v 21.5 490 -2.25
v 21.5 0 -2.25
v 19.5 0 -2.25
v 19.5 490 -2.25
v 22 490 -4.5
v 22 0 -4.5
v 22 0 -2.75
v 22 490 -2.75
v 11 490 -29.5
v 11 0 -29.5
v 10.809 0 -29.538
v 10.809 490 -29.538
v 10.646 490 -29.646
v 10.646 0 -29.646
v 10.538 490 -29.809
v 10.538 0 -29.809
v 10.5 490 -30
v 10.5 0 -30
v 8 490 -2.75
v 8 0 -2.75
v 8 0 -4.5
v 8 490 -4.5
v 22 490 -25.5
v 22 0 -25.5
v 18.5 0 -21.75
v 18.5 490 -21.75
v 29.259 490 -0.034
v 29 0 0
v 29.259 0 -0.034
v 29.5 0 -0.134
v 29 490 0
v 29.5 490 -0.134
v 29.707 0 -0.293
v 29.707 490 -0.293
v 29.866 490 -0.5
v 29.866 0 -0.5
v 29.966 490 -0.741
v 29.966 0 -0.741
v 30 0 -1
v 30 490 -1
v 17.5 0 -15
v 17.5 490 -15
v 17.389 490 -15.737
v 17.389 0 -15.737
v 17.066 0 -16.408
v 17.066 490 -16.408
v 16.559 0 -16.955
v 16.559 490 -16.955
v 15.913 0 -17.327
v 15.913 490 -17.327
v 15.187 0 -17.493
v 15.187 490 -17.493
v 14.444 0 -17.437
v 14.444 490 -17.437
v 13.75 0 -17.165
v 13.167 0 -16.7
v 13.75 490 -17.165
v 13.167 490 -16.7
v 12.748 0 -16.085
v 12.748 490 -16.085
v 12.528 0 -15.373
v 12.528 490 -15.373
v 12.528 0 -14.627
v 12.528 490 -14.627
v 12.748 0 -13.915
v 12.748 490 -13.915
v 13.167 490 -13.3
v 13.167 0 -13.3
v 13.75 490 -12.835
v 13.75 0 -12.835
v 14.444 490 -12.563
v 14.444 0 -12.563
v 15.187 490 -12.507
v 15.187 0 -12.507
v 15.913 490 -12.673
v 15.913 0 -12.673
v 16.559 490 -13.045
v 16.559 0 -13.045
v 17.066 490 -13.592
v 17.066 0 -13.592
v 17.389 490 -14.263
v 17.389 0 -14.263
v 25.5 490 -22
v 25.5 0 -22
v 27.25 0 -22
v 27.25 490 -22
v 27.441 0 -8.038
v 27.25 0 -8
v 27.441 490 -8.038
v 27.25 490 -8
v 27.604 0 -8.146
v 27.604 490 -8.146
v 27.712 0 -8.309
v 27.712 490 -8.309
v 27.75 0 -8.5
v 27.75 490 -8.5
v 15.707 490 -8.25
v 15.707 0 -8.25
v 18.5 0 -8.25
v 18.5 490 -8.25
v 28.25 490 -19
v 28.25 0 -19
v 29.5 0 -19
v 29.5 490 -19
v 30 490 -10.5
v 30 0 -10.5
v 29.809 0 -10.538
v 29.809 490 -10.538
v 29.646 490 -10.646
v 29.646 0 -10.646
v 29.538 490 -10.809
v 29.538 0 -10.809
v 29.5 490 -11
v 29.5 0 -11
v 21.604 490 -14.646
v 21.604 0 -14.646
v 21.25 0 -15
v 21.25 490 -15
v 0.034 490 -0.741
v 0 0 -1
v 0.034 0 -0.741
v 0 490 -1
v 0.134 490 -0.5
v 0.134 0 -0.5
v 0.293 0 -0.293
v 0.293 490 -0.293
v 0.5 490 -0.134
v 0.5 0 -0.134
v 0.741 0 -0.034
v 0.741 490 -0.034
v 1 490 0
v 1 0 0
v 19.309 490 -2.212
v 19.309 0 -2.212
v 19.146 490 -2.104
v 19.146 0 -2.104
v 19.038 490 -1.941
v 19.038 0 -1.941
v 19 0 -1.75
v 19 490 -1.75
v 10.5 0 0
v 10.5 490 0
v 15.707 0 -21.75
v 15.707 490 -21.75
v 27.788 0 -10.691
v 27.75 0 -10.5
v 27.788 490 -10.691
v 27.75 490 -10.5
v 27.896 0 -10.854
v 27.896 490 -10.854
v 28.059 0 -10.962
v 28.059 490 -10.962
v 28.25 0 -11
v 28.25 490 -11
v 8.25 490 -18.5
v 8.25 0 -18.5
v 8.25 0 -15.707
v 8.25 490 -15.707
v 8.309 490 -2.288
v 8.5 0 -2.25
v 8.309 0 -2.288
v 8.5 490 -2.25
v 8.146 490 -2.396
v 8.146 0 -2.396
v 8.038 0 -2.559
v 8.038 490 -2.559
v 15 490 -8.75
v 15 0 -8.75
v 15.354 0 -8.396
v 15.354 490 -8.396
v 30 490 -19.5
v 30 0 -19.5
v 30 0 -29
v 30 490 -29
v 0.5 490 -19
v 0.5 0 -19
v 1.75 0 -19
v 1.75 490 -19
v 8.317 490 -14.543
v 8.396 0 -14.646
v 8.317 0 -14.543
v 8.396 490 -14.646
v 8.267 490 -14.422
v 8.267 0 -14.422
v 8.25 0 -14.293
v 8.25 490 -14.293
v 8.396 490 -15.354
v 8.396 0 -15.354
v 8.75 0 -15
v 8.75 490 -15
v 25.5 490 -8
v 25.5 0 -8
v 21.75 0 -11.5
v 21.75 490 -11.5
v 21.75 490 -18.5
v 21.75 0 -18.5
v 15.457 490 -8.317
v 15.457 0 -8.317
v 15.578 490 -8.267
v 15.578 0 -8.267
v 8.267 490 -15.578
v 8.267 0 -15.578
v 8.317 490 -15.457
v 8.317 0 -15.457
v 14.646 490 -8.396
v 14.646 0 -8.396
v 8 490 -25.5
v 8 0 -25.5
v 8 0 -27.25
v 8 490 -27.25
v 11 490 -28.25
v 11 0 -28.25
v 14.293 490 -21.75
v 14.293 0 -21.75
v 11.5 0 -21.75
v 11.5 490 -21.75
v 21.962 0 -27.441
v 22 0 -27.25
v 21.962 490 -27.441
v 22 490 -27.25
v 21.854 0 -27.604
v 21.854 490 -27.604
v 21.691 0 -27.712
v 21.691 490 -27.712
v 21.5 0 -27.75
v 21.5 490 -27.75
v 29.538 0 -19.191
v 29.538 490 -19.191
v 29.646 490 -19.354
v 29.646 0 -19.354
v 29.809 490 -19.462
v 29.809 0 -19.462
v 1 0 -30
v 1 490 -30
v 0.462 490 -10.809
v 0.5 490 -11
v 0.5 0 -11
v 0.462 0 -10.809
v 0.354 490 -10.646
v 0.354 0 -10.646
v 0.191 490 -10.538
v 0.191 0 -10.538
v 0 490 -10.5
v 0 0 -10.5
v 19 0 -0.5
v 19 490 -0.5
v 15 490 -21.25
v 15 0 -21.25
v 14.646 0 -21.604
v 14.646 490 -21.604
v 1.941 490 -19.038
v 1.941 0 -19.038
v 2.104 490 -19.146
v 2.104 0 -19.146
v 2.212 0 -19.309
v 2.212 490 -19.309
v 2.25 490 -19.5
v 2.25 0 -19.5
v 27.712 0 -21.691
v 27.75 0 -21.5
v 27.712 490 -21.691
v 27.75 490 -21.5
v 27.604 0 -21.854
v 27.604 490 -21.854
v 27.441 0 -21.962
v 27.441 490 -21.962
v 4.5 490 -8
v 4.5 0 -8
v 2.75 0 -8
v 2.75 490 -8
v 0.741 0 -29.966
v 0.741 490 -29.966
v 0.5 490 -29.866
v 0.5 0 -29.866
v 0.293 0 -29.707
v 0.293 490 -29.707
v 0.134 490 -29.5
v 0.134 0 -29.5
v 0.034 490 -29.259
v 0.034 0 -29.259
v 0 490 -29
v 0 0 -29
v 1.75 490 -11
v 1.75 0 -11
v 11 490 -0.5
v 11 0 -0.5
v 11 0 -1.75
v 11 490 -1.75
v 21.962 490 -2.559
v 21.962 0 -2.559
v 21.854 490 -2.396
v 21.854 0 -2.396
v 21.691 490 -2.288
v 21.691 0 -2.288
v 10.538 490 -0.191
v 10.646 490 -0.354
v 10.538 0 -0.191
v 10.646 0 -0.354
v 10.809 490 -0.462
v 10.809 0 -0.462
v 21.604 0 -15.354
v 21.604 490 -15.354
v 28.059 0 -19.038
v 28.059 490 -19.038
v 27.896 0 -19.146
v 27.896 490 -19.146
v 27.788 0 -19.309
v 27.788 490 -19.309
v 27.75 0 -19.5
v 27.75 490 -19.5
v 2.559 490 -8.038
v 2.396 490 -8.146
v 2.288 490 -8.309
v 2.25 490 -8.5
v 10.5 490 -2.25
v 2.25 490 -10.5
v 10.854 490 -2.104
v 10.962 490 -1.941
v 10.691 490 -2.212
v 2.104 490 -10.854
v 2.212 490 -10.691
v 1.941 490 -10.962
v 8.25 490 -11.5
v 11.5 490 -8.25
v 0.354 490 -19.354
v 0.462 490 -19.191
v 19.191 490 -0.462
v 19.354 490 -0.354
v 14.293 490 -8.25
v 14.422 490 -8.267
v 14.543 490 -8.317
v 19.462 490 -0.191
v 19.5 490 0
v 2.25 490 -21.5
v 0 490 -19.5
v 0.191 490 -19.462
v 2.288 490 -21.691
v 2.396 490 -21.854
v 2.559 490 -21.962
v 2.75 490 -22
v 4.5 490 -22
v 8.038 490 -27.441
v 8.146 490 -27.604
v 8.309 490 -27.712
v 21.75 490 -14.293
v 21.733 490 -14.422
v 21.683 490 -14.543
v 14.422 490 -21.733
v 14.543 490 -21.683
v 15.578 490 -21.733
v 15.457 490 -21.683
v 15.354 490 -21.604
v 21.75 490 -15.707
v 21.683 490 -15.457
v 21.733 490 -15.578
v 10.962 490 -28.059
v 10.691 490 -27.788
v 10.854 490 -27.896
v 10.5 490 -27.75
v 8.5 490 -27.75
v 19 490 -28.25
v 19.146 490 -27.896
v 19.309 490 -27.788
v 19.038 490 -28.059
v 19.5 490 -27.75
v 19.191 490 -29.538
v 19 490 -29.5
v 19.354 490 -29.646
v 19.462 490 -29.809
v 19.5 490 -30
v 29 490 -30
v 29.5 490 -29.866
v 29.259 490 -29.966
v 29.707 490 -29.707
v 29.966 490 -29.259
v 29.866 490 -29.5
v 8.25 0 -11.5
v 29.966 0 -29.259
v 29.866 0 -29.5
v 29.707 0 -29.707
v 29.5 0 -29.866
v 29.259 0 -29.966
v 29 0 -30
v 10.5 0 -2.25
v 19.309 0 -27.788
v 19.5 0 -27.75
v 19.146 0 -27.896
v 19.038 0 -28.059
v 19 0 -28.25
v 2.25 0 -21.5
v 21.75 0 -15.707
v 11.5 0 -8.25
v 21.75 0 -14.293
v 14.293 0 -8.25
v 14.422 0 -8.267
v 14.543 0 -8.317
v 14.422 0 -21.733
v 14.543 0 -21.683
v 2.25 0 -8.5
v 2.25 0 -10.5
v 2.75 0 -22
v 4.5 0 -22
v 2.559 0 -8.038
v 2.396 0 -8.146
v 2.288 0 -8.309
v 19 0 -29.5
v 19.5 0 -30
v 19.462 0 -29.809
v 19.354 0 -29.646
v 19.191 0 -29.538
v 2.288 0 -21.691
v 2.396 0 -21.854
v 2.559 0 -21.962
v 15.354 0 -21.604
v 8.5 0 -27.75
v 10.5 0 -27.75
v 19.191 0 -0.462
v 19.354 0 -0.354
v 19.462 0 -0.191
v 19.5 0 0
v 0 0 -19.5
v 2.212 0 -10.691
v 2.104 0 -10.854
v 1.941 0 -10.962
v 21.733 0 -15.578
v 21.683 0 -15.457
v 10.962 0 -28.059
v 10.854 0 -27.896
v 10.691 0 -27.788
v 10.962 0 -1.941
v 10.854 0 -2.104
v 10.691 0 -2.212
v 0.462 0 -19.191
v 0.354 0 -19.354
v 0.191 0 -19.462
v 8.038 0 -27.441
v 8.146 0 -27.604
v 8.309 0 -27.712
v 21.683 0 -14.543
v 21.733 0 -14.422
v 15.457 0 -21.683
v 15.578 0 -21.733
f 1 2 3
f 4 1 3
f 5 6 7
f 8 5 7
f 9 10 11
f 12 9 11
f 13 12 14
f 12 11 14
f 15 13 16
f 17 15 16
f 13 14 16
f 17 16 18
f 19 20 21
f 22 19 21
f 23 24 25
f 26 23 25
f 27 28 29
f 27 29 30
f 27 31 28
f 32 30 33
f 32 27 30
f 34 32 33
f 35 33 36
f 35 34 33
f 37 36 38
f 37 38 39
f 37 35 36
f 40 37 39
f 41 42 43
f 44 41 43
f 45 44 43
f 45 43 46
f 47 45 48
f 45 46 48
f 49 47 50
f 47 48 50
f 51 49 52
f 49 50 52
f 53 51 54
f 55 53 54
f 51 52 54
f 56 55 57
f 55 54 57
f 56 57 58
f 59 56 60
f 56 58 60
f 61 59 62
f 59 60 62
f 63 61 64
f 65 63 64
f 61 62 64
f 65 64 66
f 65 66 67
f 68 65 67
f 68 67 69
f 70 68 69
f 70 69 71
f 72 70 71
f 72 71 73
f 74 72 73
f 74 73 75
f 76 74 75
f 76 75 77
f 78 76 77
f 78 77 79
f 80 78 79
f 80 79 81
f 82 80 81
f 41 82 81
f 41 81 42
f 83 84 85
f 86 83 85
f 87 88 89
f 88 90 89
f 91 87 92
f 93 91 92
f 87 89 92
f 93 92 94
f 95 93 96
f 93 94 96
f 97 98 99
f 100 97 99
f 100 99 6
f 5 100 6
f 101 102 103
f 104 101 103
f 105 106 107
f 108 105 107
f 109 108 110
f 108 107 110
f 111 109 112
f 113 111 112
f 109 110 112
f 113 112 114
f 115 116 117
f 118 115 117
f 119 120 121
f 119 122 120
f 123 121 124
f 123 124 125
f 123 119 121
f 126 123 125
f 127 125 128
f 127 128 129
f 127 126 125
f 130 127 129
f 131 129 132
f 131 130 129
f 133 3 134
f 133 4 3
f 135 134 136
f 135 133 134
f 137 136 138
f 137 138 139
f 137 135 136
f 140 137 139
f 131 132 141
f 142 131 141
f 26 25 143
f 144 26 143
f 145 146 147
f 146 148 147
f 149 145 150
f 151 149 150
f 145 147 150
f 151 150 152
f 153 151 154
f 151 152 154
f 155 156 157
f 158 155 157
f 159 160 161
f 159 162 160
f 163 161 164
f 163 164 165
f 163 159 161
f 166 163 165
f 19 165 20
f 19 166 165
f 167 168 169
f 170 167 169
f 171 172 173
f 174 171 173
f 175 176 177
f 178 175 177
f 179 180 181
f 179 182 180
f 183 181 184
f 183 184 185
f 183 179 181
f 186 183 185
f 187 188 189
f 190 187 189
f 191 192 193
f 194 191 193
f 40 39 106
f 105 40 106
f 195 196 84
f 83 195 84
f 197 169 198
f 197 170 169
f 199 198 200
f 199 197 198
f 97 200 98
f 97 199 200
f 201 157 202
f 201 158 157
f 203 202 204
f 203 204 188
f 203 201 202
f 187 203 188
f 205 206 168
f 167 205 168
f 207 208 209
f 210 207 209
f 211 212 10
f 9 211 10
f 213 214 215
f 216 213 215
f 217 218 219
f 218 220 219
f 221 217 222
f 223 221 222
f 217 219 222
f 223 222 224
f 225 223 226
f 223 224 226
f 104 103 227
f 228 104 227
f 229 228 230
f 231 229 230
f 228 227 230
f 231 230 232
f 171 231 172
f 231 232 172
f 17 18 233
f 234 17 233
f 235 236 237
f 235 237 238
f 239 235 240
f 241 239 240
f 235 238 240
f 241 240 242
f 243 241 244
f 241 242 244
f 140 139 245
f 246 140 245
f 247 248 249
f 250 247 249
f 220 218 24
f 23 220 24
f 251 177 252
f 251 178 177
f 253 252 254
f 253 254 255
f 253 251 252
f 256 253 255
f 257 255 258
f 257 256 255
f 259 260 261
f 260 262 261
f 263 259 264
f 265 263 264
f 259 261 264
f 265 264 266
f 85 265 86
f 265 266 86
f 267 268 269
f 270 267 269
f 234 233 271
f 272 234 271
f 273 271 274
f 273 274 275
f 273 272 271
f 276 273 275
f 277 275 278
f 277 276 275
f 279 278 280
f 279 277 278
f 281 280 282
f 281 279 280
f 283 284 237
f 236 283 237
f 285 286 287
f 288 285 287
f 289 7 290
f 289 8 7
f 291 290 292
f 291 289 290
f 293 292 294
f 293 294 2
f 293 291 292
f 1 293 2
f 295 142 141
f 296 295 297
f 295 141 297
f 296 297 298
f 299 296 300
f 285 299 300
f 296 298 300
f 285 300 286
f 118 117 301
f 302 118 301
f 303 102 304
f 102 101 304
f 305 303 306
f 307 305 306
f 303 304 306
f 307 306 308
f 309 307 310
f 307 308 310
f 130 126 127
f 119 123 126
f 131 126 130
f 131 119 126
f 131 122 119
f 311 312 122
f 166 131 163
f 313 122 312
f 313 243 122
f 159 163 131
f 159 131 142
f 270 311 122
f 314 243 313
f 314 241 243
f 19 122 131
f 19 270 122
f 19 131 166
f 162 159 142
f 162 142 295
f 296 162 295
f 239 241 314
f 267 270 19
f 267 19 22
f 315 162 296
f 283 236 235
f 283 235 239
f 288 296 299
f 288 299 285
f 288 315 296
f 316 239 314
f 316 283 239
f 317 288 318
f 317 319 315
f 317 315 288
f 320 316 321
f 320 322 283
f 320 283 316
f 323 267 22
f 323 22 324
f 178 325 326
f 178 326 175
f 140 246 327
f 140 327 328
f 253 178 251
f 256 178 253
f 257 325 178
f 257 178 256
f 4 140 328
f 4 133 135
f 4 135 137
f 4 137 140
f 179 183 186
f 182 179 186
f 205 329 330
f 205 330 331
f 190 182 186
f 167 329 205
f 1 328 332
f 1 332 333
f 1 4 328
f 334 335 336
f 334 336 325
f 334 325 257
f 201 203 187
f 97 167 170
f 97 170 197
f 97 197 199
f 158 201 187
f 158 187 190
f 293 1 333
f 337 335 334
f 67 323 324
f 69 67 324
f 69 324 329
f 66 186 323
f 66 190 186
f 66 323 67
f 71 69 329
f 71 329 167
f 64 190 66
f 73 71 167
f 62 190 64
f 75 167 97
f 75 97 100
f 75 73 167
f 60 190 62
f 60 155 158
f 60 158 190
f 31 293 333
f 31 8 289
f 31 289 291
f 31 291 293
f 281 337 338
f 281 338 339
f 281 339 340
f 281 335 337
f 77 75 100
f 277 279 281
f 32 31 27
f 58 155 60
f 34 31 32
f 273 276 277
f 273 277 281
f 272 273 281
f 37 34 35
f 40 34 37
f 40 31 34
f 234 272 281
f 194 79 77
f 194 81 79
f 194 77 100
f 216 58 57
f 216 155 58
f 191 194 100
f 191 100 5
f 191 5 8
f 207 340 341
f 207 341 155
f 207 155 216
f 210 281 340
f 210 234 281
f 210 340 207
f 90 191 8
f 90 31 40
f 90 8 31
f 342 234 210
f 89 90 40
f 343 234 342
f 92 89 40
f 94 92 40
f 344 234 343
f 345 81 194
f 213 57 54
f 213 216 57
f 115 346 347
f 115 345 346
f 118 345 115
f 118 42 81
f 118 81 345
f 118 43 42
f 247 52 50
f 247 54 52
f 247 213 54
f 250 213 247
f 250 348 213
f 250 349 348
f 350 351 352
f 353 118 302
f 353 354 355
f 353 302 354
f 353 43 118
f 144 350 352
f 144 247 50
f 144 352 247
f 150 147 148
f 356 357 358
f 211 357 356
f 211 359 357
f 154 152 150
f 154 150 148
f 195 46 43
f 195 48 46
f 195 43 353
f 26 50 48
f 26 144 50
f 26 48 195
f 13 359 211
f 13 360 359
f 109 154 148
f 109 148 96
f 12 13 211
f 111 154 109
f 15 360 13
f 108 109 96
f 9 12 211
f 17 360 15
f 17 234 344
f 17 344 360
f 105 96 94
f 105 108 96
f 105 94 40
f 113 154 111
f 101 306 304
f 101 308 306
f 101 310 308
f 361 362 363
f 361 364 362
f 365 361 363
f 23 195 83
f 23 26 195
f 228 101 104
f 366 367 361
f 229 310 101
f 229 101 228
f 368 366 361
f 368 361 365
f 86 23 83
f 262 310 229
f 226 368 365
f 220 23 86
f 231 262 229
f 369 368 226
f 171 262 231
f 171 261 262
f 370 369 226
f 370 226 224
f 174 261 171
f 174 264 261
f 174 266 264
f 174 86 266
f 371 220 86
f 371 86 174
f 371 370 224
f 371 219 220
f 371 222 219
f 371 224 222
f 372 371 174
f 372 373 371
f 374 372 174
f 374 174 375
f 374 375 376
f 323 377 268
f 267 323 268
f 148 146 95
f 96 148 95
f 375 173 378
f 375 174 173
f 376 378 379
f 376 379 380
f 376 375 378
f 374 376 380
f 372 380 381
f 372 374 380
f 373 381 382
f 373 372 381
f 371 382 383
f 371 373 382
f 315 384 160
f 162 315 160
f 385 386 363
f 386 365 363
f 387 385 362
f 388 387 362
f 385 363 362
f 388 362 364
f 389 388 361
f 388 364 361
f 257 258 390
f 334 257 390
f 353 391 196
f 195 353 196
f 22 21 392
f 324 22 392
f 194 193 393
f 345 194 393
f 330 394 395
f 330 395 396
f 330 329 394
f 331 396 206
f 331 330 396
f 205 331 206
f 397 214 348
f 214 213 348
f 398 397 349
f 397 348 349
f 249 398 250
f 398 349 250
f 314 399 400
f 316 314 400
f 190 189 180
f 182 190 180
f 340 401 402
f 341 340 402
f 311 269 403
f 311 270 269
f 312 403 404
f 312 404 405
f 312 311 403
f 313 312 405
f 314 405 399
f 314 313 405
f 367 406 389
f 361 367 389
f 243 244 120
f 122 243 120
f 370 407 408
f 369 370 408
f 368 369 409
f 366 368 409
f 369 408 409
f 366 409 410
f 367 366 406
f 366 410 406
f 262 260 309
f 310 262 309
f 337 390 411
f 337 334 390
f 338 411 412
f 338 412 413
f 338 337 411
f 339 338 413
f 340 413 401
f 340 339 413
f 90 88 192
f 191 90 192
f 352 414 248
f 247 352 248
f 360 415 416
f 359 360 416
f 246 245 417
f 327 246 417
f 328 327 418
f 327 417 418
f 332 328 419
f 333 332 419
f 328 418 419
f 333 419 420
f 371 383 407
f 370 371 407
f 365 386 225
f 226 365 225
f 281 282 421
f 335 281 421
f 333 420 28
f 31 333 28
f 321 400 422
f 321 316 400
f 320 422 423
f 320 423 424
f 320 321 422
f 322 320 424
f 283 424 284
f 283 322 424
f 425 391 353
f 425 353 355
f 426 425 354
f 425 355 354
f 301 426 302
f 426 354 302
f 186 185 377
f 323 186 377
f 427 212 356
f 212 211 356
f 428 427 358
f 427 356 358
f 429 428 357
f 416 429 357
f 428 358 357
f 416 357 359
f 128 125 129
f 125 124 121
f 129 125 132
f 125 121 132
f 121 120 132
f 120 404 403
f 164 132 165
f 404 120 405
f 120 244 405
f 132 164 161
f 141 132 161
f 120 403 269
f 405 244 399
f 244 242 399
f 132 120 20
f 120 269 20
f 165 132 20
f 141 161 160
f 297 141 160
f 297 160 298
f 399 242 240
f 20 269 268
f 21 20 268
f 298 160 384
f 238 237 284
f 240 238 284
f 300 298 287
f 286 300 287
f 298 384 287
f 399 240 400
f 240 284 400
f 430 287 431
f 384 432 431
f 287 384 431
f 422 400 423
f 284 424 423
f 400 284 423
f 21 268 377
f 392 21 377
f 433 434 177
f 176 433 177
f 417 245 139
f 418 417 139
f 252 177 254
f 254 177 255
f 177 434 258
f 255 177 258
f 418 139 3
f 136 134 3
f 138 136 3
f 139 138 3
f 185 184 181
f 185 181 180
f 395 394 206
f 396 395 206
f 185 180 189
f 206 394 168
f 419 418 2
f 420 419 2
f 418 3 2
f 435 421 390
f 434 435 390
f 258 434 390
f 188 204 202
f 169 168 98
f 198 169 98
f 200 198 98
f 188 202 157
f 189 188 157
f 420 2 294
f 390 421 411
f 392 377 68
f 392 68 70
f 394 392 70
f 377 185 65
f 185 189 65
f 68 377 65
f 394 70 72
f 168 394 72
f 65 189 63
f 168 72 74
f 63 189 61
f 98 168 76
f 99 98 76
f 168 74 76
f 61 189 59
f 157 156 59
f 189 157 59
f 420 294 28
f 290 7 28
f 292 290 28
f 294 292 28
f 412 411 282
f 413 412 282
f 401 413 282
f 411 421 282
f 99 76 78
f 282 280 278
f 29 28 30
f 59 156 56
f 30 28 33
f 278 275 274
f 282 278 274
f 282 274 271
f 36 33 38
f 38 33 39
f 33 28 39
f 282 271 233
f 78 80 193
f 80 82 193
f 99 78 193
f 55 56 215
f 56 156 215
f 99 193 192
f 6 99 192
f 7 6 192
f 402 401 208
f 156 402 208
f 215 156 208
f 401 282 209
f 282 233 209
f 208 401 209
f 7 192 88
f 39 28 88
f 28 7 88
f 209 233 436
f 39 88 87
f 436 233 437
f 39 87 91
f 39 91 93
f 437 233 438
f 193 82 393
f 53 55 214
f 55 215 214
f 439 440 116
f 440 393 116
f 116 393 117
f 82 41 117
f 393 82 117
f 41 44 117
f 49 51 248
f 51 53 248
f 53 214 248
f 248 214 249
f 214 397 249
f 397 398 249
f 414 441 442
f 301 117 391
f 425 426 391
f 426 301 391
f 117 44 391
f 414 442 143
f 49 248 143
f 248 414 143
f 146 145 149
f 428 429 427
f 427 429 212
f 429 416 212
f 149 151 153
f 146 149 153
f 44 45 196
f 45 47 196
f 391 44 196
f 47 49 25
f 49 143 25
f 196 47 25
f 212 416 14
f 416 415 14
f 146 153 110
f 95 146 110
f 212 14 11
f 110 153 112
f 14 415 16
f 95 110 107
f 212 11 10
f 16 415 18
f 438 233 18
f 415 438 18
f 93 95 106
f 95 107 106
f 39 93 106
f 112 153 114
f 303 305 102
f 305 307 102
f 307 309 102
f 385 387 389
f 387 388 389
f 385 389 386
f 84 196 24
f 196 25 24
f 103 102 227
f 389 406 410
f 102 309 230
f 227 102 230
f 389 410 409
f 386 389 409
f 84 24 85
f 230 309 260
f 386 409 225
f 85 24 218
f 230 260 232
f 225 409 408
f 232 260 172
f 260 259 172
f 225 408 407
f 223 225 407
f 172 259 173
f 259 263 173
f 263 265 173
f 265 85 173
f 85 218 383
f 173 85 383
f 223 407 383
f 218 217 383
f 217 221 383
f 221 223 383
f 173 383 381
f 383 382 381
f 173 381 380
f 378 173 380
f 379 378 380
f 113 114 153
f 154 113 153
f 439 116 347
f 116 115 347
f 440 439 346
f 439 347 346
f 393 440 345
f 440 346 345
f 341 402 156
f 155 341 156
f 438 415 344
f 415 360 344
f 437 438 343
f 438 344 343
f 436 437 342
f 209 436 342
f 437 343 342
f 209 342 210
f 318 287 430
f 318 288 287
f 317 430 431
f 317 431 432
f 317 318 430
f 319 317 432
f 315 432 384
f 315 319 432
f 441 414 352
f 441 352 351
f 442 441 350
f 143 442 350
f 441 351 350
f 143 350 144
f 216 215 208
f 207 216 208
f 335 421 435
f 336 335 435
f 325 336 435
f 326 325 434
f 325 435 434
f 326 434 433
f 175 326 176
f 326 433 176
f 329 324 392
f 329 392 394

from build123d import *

# Parameters (mm, degrees)
BOSS_EXTRUDE1_DEPTH = 490
FILLET1_R           = 1
SKETCH4_R           = 2.5
CUT_EXTRUDE1_DEPTH  = 491
FILLET2_R           = 0.5


with BuildPart() as part:
    # Sketch3 → Boss-Extrude1 (new body)
    with BuildSketch(Plane(origin=(0, 0, 0), x_dir=(1, 0, 0), z_dir=(0, 1, 0))):
        with BuildLine():
            Line((11, 27.75), (11, 29.5))
            ThreePointArc((11, 29.5), (10.646446609, 29.646446609), (10.5, 30))
            Line((10.5, 30), (0, 30))
            Line((0, 30), (0, 19.5))
            ThreePointArc((0, 19.5), (0.353553391, 19.353553391), (0.5, 19))
            Line((0.5, 19), (2.25, 19))
            Line((2.25, 19), (2.25, 22))
            Line((2.25, 22), (4.5, 22))
            Line((4.5, 22), (8.25, 18.5))
            Line((8.25, 18.5), (8.25, 15.5))
            Line((8.25, 15.5), (8.75, 15))
            Line((8.75, 15), (8.25, 14.5))
            Line((8.25, 14.5), (8.25, 11.5))
            Line((8.25, 11.5), (4.5, 8))
            Line((4.5, 8), (2.25, 8))
            Line((2.25, 8), (2.25, 11))
            Line((2.25, 11), (0.5, 11))
            ThreePointArc((0.5, 11), (0.353553391, 10.646446609), (0, 10.5))
            Line((0, 10.5), (0, 0))
            Line((0, 0), (10.5, 0))
            ThreePointArc((10.5, 0), (10.646446609, 0.353553391), (11, 0.5))
            Line((11, 0.5), (11, 2.25))
            Line((11, 2.25), (8, 2.25))
            Line((8, 2.25), (8, 4.5))
            Line((8, 4.5), (11.5, 8.25))
            Line((11.5, 8.25), (14.5, 8.25))
            Line((14.5, 8.25), (15, 8.75))
            Line((15, 8.75), (15.5, 8.25))
            Line((15.5, 8.25), (18.5, 8.25))
            Line((18.5, 8.25), (22, 4.5))
            Line((22, 4.5), (22, 2.25))
            Line((22, 2.25), (19, 2.25))
            Line((19, 2.25), (19, 0.5))
            ThreePointArc((19, 0.5), (19.353553391, 0.353553391), (19.5, 0))
            Line((19.5, 0), (30, 0))
            Line((30, 0), (30, 10.5))
            ThreePointArc((30, 10.5), (29.646446609, 10.646446609), (29.5, 11))
            Line((29.5, 11), (27.75, 11))
            Line((27.75, 11), (27.75, 8))
            Line((27.75, 8), (25.5, 8))
            Line((25.5, 8), (21.75, 11.5))
            Line((21.75, 11.5), (21.75, 14.5))
            Line((21.75, 14.5), (21.25, 15))
            Line((21.25, 15), (21.75, 15.5))
            Line((21.75, 15.5), (21.75, 18.5))
            Line((21.75, 18.5), (25.5, 22))
            Line((25.5, 22), (27.75, 22))
            Line((27.75, 22), (27.75, 19))
            Line((27.75, 19), (29.5, 19))
            ThreePointArc((29.5, 19), (29.646446609, 19.353553391), (30, 19.5))
            Line((30, 19.5), (30, 30))
            Line((30, 30), (19.5, 30))
            ThreePointArc((19.5, 30), (19.353553391, 29.646446609), (19, 29.5))
            Line((19, 29.5), (19, 27.75))
            Line((19, 27.75), (22, 27.75))
            Line((22, 27.75), (22, 25.5))
            Line((22, 25.5), (18.5, 21.75))
            Line((18.5, 21.75), (15.5, 21.75))
            Line((15.5, 21.75), (15, 21.25))
            Line((15, 21.25), (14.5, 21.75))
            Line((14.5, 21.75), (11.5, 21.75))
            Line((11.5, 21.75), (8, 25.5))
            Line((8, 25.5), (8, 27.75))
            Line((8, 27.75), (11, 27.75))
        make_face()
    extrude(amount=BOSS_EXTRUDE1_DEPTH)

    # Fillet1
    fillet1_edges = [part.edges().sort_by_distance(p)[0] for p in [
        (30, 245, 0),
        (0, 245, 0),
        (0, 245, -30),
        (30, 245, -30),
    ]]
    fillet(fillet1_edges, radius=FILLET1_R)

    # Sketch4 → Cut-Extrude1 (cut, through all)
    with BuildSketch(Plane(origin=(0, 490, 0), x_dir=(1, 0, 0), z_dir=(0, 1, 0))):
        with Locations((15, 15)):
            Circle(SKETCH4_R)
    extrude(amount=-CUT_EXTRUDE1_DEPTH, mode=Mode.SUBTRACT)

    # Fillet2
    fillet2_edges = [part.edges().sort_by_distance(p)[0] for p in [
        (27.75, 245, -19),
        (27.75, 245, -22),
        (21.75, 245, -15.5),
        (21.75, 245, -14.5),
        (27.75, 245, -8),
        (27.75, 245, -11),
        (19, 245, -2.25),
        (22, 245, -2.25),
        (15.5, 245, -8.25),
        (14.5, 245, -8.25),
        (8, 245, -2.25),
        (11, 245, -2.25),
        (2.25, 245, -11),
        (2.25, 245, -8),
        (8.25, 245, -14.5),
        (8.25, 245, -15.5),
        (2.25, 245, -22),
        (2.25, 245, -19),
        (11, 245, -27.75),
        (8, 245, -27.75),
        (14.5, 245, -21.75),
        (15.5, 245, -21.75),
        (22, 245, -27.75),
        (19, 245, -27.75),
    ]]
    fillet(fillet2_edges, radius=FILLET2_R)


solid = part.part
